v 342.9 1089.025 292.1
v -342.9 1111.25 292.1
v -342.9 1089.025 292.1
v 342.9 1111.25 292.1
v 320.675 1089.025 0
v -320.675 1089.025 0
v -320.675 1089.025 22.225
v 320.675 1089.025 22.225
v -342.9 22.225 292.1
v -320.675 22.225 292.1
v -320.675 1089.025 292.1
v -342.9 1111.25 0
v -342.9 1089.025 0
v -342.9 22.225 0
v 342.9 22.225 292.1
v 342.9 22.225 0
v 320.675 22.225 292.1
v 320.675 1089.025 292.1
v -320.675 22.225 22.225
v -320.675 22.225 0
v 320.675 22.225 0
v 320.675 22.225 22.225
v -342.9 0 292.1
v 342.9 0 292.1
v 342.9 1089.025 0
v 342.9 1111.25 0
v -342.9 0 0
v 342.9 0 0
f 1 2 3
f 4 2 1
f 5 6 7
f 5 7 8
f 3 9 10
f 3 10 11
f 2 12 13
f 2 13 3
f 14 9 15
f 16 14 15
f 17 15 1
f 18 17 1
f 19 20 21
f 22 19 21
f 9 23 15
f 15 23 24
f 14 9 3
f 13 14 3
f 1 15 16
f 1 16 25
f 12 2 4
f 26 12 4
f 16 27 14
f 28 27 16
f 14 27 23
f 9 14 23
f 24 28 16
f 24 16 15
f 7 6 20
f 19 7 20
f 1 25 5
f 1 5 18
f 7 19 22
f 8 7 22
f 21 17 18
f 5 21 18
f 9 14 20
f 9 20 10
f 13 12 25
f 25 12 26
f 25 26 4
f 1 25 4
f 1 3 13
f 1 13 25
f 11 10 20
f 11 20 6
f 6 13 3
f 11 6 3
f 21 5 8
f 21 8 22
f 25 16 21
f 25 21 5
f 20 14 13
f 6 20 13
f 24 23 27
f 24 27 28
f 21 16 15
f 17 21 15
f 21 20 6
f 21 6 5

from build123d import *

# Parameters (mm, degrees)
F1_W     = 685.8
F1_H     = 292.1
F2_DEPTH = 22.225
F3_W     = 641.35
F3_H     = 1066.8
F4_DEPTH = 22.225
F5_W     = 1066.8
F5_H     = 292.1
F6_DEPTH = 22.225


# Not quite as in the source:
# - a variable given as a bare number and used for a length is read in inches; the dataset says mm whatever the document's units were
# - a length typed as a fraction of an inch, garbled in the dataset ("3 / 203.2 mm" for 3/8 in), is restored


with BuildPart() as f2:
    # F1 (on Front) → F2 (new body)
    with BuildSketch(Plane.XZ):
        with Locations((0, 146.05)):
            Rectangle(F1_W, F1_H)
    extrude(amount=-F2_DEPTH)


with BuildPart() as f4:
    # F3 (on face) → F4 (new body)
    with BuildSketch(Plane(origin=(0, 0, 0), x_dir=(1, 0, 0), z_dir=(0, 0, -1))):
        with Locations((0, -555.625)):
            Rectangle(F3_W, F3_H)
    extrude(amount=-F4_DEPTH)


with BuildPart() as f6:
    # F5 (on face) → F6 (new body)
    with BuildSketch(Plane.YZ.offset(342.9)):
        with Locations((555.625, 146.05)):
            Rectangle(F5_W, F5_H)
    extrude(amount=-F6_DEPTH)


with BuildPart() as f7_1:
    # F7: instance of F6
    add(f6.part.mirror(Plane.YZ))


with BuildPart() as f9_1:
    # F9: instance of F2
    add(f2.part.mirror(Plane(origin=(331.7875, 555.625, 146.05), x_dir=(1, 0, 0), z_dir=(0, -1, 0))))


solid = Compound([f2.part, f4.part, f6.part, f7_1.part, f9_1.part])
